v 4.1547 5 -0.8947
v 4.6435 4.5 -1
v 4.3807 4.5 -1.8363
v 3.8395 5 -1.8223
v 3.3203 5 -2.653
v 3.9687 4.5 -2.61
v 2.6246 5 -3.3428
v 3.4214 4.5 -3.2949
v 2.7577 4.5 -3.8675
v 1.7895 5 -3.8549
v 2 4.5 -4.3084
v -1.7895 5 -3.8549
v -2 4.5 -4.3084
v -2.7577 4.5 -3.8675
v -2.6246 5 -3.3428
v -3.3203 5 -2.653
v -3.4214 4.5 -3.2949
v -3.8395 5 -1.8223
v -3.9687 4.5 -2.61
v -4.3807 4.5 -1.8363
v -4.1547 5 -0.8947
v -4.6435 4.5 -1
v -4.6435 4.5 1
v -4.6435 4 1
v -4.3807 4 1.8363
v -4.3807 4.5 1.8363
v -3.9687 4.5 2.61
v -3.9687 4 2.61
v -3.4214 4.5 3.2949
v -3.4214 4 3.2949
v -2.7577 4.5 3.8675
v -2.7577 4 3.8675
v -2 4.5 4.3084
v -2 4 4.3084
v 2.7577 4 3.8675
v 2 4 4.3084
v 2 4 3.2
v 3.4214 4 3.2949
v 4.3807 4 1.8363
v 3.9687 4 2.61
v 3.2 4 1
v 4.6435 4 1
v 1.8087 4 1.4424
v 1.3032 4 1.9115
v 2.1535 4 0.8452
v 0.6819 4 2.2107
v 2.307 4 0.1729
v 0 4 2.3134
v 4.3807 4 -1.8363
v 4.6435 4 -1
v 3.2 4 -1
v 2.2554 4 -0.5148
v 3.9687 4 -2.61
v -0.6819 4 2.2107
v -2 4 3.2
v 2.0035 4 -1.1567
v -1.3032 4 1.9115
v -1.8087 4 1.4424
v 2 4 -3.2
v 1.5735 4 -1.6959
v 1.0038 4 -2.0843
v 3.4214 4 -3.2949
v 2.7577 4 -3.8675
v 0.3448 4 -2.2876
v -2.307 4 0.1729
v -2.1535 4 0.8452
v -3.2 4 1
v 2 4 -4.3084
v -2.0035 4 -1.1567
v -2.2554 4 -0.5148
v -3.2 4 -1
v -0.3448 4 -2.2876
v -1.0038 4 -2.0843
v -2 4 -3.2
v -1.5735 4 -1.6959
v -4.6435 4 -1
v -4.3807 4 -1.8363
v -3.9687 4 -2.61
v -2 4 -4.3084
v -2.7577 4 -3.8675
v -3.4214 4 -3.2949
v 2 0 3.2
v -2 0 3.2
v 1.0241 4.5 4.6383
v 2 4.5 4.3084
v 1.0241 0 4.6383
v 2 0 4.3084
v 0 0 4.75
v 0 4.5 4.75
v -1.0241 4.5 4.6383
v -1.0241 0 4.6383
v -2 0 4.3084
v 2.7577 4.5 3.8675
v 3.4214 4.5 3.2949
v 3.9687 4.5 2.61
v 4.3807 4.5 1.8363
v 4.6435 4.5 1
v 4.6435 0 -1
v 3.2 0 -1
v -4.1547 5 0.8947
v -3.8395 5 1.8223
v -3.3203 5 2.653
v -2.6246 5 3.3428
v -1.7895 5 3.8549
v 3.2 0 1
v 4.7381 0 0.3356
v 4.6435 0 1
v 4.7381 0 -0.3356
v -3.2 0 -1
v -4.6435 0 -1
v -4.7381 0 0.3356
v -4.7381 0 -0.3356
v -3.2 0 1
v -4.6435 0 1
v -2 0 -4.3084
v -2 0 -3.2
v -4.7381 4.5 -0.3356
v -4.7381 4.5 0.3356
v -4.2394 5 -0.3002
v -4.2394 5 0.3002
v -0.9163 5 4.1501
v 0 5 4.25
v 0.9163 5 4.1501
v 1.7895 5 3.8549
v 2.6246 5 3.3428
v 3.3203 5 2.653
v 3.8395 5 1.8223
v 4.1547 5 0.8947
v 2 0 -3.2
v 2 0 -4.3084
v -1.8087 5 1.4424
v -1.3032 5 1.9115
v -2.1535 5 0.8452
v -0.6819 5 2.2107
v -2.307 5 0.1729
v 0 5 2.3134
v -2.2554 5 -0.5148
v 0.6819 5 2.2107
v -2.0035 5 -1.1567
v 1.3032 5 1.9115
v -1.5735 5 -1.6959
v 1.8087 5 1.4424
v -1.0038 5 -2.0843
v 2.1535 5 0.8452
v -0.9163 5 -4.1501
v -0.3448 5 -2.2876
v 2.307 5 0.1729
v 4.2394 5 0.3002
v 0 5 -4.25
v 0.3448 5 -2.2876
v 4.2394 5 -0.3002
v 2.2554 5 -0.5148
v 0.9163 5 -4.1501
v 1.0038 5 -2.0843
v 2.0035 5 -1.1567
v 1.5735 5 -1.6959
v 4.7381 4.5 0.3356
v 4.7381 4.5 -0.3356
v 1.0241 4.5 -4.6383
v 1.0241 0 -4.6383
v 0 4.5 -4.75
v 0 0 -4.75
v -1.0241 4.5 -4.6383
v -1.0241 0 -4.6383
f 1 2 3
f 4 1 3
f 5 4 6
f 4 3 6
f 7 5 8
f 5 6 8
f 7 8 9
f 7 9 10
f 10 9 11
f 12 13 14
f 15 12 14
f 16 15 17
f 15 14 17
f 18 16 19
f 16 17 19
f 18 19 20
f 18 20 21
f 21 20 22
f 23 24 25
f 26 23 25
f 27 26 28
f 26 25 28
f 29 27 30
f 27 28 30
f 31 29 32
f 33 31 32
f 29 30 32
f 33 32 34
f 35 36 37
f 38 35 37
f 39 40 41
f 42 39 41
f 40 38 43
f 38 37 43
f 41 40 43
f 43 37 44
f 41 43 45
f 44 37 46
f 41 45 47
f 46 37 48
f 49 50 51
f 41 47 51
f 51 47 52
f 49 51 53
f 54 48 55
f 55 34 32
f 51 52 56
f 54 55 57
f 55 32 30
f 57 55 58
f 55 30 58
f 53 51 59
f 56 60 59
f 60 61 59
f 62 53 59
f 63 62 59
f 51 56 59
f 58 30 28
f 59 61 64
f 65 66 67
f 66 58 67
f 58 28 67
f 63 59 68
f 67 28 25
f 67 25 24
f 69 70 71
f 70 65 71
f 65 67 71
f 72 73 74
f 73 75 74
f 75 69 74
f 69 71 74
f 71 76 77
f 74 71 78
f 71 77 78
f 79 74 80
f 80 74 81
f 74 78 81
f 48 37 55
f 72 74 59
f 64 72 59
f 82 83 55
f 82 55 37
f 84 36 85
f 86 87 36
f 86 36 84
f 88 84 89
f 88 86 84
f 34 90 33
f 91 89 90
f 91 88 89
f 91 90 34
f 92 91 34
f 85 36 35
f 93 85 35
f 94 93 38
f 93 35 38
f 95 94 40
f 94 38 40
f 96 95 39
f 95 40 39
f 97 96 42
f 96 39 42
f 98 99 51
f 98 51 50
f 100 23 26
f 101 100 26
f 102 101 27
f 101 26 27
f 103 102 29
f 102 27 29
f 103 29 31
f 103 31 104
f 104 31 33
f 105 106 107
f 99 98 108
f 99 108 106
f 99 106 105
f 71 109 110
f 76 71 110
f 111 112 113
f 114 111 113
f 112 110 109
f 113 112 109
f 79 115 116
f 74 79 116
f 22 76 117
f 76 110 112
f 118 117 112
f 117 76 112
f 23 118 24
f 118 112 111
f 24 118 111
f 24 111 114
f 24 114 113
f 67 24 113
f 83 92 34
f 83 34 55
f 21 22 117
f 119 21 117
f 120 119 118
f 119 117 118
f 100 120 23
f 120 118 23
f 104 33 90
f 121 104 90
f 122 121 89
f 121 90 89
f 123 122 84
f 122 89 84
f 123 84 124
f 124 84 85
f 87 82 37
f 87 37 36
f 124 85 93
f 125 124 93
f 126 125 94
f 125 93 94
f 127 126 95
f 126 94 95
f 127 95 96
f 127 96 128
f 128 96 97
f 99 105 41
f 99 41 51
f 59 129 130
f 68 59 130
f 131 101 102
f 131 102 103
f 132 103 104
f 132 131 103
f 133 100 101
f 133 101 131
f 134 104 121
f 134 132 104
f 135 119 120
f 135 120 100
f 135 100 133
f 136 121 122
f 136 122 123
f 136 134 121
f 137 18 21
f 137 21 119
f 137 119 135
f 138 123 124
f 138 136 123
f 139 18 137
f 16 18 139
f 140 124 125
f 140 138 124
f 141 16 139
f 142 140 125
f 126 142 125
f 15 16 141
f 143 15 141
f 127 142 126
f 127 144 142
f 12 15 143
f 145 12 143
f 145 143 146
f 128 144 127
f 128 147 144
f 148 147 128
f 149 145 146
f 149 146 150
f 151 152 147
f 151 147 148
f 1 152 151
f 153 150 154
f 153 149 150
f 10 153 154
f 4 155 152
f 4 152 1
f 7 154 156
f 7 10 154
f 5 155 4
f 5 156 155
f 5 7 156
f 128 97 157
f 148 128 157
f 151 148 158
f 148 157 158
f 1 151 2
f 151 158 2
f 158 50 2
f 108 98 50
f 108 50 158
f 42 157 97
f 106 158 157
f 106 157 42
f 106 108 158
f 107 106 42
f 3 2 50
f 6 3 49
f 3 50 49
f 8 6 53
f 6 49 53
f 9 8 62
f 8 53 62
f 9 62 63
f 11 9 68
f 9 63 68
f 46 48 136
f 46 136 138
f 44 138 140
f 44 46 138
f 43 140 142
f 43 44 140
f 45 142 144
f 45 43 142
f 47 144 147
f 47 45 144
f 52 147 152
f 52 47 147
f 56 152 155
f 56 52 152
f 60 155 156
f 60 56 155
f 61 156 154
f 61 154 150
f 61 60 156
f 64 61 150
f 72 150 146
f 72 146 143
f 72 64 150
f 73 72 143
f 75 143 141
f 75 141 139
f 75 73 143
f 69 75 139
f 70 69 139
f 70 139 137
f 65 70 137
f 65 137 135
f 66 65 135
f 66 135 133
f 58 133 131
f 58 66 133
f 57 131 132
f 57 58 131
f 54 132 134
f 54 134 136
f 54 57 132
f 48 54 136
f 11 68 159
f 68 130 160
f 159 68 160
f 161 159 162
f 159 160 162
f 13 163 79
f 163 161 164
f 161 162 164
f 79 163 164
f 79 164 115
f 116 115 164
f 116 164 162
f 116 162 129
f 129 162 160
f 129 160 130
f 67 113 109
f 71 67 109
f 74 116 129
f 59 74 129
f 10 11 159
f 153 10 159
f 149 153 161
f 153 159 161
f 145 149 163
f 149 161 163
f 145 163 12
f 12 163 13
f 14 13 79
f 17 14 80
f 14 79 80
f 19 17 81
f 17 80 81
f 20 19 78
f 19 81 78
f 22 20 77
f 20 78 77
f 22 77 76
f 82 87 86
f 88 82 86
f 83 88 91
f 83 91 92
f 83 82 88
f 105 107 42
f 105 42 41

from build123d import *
from build123d.topology import SkipClean

# Parameters (mm, degrees)
BOSS_EXTRUDE1_DEPTH   = 5
BOSS_EXTRUDE1_2_DEPTH = 5
BOSS_EXTRUDE1_3_DEPTH = 5
BOSS_EXTRUDE1_4_DEPTH = 5
BOSS_EXTRUDE2_START   = -1
SKETCH2_R             = 4.75
SKETCH2_R_2           = 2.313447094
BOSS_EXTRUDE2_DEPTH   = 1
CHAMFER1_SIZE         = 0.5


with BuildPart() as part:
    # Sketch1 → Boss-Extrude1 (new body)
    with BuildSketch(Plane(origin=(0, 0, 0), x_dir=(1, 0, 0), z_dir=(0, 1, 0))):
        with BuildLine():
            Line((3.2, -1), (3.2, 1))
            Line((3.2, 1), (4.643543905, 1))
            ThreePointArc((4.643543905, 1), (4.75, 0), (4.643543905, -1))
            Line((4.643543905, -1), (3.2, -1))
        make_face()
    extrude(amount=BOSS_EXTRUDE1_DEPTH)



with BuildPart() as body_2:
    # Sketch1 → Boss-Extrude1 2 (new body)
    with BuildSketch(Plane(origin=(0, 0, 0), x_dir=(1, 0, 0), z_dir=(0, 1, 0))):
        with BuildLine():
            Line((-4.643543905, -1), (-3.2, -1))
            Line((-3.2, -1), (-3.2, 1))
            Line((-3.2, 1), (-4.643543905, 1))
            ThreePointArc((-4.643543905, 1), (-4.75, 0), (-4.643543905, -1))
        make_face()
    extrude(amount=BOSS_EXTRUDE1_2_DEPTH)


with BuildPart() as body_3:
    # Sketch1 → Boss-Extrude1 3 (new body)
    with BuildSketch(Plane(origin=(0, 0, 0), x_dir=(1, 0, 0), z_dir=(0, 1, 0))):
        with BuildLine():
            Line((-2, -4.308421985), (-2, -3.2))
            Line((-2, -3.2), (2, -3.2))
            Line((2, -3.2), (2, -4.308421985))
            ThreePointArc((2, -4.308421985), (0, -4.75), (-2, -4.308421985))
        make_face()
    extrude(amount=BOSS_EXTRUDE1_3_DEPTH)


with BuildPart() as body_4:
    # Sketch1 → Boss-Extrude1 4 (new body)
    with BuildSketch(Plane(origin=(0, 0, 0), x_dir=(1, 0, 0), z_dir=(0, 1, 0))):
        with BuildLine():
            Line((-2, 4.308421985), (-2, 3.2))
            Line((-2, 3.2), (2, 3.2))
            Line((2, 3.2), (2, 4.308421985))
            ThreePointArc((2, 4.308421985), (0, 4.75), (-2, 4.308421985))
        make_face()
    extrude(amount=BOSS_EXTRUDE1_4_DEPTH)


with BuildPart() as part_1:
    with SkipClean():  # the faces are left unmerged after this step: merging them gives an invalid solid
        add(part.part)

        add(body_2.part)  # Boss-Extrude2 merges body 2

        add(body_3.part)  # Boss-Extrude2 merges body 3

        add(body_4.part)  # Boss-Extrude2 merges body 4
        # Sketch2 → Boss-Extrude2 (add)
        with BuildSketch(Plane(origin=(0, 5, 0), x_dir=(1, 0, 0), z_dir=(0, 1, 0)).offset(BOSS_EXTRUDE2_START)):
            Circle(SKETCH2_R)
            Circle(SKETCH2_R_2, mode=Mode.SUBTRACT)
        extrude(amount=BOSS_EXTRUDE2_DEPTH)

    # Chamfer1
    chamfer1_edges = [part_1.edges().sort_by_distance(p)[0] for p in [
        (0, 5, -4.75),
    ]]
    chamfer(chamfer1_edges, length=CHAMFER1_SIZE)


solid = part_1.part
